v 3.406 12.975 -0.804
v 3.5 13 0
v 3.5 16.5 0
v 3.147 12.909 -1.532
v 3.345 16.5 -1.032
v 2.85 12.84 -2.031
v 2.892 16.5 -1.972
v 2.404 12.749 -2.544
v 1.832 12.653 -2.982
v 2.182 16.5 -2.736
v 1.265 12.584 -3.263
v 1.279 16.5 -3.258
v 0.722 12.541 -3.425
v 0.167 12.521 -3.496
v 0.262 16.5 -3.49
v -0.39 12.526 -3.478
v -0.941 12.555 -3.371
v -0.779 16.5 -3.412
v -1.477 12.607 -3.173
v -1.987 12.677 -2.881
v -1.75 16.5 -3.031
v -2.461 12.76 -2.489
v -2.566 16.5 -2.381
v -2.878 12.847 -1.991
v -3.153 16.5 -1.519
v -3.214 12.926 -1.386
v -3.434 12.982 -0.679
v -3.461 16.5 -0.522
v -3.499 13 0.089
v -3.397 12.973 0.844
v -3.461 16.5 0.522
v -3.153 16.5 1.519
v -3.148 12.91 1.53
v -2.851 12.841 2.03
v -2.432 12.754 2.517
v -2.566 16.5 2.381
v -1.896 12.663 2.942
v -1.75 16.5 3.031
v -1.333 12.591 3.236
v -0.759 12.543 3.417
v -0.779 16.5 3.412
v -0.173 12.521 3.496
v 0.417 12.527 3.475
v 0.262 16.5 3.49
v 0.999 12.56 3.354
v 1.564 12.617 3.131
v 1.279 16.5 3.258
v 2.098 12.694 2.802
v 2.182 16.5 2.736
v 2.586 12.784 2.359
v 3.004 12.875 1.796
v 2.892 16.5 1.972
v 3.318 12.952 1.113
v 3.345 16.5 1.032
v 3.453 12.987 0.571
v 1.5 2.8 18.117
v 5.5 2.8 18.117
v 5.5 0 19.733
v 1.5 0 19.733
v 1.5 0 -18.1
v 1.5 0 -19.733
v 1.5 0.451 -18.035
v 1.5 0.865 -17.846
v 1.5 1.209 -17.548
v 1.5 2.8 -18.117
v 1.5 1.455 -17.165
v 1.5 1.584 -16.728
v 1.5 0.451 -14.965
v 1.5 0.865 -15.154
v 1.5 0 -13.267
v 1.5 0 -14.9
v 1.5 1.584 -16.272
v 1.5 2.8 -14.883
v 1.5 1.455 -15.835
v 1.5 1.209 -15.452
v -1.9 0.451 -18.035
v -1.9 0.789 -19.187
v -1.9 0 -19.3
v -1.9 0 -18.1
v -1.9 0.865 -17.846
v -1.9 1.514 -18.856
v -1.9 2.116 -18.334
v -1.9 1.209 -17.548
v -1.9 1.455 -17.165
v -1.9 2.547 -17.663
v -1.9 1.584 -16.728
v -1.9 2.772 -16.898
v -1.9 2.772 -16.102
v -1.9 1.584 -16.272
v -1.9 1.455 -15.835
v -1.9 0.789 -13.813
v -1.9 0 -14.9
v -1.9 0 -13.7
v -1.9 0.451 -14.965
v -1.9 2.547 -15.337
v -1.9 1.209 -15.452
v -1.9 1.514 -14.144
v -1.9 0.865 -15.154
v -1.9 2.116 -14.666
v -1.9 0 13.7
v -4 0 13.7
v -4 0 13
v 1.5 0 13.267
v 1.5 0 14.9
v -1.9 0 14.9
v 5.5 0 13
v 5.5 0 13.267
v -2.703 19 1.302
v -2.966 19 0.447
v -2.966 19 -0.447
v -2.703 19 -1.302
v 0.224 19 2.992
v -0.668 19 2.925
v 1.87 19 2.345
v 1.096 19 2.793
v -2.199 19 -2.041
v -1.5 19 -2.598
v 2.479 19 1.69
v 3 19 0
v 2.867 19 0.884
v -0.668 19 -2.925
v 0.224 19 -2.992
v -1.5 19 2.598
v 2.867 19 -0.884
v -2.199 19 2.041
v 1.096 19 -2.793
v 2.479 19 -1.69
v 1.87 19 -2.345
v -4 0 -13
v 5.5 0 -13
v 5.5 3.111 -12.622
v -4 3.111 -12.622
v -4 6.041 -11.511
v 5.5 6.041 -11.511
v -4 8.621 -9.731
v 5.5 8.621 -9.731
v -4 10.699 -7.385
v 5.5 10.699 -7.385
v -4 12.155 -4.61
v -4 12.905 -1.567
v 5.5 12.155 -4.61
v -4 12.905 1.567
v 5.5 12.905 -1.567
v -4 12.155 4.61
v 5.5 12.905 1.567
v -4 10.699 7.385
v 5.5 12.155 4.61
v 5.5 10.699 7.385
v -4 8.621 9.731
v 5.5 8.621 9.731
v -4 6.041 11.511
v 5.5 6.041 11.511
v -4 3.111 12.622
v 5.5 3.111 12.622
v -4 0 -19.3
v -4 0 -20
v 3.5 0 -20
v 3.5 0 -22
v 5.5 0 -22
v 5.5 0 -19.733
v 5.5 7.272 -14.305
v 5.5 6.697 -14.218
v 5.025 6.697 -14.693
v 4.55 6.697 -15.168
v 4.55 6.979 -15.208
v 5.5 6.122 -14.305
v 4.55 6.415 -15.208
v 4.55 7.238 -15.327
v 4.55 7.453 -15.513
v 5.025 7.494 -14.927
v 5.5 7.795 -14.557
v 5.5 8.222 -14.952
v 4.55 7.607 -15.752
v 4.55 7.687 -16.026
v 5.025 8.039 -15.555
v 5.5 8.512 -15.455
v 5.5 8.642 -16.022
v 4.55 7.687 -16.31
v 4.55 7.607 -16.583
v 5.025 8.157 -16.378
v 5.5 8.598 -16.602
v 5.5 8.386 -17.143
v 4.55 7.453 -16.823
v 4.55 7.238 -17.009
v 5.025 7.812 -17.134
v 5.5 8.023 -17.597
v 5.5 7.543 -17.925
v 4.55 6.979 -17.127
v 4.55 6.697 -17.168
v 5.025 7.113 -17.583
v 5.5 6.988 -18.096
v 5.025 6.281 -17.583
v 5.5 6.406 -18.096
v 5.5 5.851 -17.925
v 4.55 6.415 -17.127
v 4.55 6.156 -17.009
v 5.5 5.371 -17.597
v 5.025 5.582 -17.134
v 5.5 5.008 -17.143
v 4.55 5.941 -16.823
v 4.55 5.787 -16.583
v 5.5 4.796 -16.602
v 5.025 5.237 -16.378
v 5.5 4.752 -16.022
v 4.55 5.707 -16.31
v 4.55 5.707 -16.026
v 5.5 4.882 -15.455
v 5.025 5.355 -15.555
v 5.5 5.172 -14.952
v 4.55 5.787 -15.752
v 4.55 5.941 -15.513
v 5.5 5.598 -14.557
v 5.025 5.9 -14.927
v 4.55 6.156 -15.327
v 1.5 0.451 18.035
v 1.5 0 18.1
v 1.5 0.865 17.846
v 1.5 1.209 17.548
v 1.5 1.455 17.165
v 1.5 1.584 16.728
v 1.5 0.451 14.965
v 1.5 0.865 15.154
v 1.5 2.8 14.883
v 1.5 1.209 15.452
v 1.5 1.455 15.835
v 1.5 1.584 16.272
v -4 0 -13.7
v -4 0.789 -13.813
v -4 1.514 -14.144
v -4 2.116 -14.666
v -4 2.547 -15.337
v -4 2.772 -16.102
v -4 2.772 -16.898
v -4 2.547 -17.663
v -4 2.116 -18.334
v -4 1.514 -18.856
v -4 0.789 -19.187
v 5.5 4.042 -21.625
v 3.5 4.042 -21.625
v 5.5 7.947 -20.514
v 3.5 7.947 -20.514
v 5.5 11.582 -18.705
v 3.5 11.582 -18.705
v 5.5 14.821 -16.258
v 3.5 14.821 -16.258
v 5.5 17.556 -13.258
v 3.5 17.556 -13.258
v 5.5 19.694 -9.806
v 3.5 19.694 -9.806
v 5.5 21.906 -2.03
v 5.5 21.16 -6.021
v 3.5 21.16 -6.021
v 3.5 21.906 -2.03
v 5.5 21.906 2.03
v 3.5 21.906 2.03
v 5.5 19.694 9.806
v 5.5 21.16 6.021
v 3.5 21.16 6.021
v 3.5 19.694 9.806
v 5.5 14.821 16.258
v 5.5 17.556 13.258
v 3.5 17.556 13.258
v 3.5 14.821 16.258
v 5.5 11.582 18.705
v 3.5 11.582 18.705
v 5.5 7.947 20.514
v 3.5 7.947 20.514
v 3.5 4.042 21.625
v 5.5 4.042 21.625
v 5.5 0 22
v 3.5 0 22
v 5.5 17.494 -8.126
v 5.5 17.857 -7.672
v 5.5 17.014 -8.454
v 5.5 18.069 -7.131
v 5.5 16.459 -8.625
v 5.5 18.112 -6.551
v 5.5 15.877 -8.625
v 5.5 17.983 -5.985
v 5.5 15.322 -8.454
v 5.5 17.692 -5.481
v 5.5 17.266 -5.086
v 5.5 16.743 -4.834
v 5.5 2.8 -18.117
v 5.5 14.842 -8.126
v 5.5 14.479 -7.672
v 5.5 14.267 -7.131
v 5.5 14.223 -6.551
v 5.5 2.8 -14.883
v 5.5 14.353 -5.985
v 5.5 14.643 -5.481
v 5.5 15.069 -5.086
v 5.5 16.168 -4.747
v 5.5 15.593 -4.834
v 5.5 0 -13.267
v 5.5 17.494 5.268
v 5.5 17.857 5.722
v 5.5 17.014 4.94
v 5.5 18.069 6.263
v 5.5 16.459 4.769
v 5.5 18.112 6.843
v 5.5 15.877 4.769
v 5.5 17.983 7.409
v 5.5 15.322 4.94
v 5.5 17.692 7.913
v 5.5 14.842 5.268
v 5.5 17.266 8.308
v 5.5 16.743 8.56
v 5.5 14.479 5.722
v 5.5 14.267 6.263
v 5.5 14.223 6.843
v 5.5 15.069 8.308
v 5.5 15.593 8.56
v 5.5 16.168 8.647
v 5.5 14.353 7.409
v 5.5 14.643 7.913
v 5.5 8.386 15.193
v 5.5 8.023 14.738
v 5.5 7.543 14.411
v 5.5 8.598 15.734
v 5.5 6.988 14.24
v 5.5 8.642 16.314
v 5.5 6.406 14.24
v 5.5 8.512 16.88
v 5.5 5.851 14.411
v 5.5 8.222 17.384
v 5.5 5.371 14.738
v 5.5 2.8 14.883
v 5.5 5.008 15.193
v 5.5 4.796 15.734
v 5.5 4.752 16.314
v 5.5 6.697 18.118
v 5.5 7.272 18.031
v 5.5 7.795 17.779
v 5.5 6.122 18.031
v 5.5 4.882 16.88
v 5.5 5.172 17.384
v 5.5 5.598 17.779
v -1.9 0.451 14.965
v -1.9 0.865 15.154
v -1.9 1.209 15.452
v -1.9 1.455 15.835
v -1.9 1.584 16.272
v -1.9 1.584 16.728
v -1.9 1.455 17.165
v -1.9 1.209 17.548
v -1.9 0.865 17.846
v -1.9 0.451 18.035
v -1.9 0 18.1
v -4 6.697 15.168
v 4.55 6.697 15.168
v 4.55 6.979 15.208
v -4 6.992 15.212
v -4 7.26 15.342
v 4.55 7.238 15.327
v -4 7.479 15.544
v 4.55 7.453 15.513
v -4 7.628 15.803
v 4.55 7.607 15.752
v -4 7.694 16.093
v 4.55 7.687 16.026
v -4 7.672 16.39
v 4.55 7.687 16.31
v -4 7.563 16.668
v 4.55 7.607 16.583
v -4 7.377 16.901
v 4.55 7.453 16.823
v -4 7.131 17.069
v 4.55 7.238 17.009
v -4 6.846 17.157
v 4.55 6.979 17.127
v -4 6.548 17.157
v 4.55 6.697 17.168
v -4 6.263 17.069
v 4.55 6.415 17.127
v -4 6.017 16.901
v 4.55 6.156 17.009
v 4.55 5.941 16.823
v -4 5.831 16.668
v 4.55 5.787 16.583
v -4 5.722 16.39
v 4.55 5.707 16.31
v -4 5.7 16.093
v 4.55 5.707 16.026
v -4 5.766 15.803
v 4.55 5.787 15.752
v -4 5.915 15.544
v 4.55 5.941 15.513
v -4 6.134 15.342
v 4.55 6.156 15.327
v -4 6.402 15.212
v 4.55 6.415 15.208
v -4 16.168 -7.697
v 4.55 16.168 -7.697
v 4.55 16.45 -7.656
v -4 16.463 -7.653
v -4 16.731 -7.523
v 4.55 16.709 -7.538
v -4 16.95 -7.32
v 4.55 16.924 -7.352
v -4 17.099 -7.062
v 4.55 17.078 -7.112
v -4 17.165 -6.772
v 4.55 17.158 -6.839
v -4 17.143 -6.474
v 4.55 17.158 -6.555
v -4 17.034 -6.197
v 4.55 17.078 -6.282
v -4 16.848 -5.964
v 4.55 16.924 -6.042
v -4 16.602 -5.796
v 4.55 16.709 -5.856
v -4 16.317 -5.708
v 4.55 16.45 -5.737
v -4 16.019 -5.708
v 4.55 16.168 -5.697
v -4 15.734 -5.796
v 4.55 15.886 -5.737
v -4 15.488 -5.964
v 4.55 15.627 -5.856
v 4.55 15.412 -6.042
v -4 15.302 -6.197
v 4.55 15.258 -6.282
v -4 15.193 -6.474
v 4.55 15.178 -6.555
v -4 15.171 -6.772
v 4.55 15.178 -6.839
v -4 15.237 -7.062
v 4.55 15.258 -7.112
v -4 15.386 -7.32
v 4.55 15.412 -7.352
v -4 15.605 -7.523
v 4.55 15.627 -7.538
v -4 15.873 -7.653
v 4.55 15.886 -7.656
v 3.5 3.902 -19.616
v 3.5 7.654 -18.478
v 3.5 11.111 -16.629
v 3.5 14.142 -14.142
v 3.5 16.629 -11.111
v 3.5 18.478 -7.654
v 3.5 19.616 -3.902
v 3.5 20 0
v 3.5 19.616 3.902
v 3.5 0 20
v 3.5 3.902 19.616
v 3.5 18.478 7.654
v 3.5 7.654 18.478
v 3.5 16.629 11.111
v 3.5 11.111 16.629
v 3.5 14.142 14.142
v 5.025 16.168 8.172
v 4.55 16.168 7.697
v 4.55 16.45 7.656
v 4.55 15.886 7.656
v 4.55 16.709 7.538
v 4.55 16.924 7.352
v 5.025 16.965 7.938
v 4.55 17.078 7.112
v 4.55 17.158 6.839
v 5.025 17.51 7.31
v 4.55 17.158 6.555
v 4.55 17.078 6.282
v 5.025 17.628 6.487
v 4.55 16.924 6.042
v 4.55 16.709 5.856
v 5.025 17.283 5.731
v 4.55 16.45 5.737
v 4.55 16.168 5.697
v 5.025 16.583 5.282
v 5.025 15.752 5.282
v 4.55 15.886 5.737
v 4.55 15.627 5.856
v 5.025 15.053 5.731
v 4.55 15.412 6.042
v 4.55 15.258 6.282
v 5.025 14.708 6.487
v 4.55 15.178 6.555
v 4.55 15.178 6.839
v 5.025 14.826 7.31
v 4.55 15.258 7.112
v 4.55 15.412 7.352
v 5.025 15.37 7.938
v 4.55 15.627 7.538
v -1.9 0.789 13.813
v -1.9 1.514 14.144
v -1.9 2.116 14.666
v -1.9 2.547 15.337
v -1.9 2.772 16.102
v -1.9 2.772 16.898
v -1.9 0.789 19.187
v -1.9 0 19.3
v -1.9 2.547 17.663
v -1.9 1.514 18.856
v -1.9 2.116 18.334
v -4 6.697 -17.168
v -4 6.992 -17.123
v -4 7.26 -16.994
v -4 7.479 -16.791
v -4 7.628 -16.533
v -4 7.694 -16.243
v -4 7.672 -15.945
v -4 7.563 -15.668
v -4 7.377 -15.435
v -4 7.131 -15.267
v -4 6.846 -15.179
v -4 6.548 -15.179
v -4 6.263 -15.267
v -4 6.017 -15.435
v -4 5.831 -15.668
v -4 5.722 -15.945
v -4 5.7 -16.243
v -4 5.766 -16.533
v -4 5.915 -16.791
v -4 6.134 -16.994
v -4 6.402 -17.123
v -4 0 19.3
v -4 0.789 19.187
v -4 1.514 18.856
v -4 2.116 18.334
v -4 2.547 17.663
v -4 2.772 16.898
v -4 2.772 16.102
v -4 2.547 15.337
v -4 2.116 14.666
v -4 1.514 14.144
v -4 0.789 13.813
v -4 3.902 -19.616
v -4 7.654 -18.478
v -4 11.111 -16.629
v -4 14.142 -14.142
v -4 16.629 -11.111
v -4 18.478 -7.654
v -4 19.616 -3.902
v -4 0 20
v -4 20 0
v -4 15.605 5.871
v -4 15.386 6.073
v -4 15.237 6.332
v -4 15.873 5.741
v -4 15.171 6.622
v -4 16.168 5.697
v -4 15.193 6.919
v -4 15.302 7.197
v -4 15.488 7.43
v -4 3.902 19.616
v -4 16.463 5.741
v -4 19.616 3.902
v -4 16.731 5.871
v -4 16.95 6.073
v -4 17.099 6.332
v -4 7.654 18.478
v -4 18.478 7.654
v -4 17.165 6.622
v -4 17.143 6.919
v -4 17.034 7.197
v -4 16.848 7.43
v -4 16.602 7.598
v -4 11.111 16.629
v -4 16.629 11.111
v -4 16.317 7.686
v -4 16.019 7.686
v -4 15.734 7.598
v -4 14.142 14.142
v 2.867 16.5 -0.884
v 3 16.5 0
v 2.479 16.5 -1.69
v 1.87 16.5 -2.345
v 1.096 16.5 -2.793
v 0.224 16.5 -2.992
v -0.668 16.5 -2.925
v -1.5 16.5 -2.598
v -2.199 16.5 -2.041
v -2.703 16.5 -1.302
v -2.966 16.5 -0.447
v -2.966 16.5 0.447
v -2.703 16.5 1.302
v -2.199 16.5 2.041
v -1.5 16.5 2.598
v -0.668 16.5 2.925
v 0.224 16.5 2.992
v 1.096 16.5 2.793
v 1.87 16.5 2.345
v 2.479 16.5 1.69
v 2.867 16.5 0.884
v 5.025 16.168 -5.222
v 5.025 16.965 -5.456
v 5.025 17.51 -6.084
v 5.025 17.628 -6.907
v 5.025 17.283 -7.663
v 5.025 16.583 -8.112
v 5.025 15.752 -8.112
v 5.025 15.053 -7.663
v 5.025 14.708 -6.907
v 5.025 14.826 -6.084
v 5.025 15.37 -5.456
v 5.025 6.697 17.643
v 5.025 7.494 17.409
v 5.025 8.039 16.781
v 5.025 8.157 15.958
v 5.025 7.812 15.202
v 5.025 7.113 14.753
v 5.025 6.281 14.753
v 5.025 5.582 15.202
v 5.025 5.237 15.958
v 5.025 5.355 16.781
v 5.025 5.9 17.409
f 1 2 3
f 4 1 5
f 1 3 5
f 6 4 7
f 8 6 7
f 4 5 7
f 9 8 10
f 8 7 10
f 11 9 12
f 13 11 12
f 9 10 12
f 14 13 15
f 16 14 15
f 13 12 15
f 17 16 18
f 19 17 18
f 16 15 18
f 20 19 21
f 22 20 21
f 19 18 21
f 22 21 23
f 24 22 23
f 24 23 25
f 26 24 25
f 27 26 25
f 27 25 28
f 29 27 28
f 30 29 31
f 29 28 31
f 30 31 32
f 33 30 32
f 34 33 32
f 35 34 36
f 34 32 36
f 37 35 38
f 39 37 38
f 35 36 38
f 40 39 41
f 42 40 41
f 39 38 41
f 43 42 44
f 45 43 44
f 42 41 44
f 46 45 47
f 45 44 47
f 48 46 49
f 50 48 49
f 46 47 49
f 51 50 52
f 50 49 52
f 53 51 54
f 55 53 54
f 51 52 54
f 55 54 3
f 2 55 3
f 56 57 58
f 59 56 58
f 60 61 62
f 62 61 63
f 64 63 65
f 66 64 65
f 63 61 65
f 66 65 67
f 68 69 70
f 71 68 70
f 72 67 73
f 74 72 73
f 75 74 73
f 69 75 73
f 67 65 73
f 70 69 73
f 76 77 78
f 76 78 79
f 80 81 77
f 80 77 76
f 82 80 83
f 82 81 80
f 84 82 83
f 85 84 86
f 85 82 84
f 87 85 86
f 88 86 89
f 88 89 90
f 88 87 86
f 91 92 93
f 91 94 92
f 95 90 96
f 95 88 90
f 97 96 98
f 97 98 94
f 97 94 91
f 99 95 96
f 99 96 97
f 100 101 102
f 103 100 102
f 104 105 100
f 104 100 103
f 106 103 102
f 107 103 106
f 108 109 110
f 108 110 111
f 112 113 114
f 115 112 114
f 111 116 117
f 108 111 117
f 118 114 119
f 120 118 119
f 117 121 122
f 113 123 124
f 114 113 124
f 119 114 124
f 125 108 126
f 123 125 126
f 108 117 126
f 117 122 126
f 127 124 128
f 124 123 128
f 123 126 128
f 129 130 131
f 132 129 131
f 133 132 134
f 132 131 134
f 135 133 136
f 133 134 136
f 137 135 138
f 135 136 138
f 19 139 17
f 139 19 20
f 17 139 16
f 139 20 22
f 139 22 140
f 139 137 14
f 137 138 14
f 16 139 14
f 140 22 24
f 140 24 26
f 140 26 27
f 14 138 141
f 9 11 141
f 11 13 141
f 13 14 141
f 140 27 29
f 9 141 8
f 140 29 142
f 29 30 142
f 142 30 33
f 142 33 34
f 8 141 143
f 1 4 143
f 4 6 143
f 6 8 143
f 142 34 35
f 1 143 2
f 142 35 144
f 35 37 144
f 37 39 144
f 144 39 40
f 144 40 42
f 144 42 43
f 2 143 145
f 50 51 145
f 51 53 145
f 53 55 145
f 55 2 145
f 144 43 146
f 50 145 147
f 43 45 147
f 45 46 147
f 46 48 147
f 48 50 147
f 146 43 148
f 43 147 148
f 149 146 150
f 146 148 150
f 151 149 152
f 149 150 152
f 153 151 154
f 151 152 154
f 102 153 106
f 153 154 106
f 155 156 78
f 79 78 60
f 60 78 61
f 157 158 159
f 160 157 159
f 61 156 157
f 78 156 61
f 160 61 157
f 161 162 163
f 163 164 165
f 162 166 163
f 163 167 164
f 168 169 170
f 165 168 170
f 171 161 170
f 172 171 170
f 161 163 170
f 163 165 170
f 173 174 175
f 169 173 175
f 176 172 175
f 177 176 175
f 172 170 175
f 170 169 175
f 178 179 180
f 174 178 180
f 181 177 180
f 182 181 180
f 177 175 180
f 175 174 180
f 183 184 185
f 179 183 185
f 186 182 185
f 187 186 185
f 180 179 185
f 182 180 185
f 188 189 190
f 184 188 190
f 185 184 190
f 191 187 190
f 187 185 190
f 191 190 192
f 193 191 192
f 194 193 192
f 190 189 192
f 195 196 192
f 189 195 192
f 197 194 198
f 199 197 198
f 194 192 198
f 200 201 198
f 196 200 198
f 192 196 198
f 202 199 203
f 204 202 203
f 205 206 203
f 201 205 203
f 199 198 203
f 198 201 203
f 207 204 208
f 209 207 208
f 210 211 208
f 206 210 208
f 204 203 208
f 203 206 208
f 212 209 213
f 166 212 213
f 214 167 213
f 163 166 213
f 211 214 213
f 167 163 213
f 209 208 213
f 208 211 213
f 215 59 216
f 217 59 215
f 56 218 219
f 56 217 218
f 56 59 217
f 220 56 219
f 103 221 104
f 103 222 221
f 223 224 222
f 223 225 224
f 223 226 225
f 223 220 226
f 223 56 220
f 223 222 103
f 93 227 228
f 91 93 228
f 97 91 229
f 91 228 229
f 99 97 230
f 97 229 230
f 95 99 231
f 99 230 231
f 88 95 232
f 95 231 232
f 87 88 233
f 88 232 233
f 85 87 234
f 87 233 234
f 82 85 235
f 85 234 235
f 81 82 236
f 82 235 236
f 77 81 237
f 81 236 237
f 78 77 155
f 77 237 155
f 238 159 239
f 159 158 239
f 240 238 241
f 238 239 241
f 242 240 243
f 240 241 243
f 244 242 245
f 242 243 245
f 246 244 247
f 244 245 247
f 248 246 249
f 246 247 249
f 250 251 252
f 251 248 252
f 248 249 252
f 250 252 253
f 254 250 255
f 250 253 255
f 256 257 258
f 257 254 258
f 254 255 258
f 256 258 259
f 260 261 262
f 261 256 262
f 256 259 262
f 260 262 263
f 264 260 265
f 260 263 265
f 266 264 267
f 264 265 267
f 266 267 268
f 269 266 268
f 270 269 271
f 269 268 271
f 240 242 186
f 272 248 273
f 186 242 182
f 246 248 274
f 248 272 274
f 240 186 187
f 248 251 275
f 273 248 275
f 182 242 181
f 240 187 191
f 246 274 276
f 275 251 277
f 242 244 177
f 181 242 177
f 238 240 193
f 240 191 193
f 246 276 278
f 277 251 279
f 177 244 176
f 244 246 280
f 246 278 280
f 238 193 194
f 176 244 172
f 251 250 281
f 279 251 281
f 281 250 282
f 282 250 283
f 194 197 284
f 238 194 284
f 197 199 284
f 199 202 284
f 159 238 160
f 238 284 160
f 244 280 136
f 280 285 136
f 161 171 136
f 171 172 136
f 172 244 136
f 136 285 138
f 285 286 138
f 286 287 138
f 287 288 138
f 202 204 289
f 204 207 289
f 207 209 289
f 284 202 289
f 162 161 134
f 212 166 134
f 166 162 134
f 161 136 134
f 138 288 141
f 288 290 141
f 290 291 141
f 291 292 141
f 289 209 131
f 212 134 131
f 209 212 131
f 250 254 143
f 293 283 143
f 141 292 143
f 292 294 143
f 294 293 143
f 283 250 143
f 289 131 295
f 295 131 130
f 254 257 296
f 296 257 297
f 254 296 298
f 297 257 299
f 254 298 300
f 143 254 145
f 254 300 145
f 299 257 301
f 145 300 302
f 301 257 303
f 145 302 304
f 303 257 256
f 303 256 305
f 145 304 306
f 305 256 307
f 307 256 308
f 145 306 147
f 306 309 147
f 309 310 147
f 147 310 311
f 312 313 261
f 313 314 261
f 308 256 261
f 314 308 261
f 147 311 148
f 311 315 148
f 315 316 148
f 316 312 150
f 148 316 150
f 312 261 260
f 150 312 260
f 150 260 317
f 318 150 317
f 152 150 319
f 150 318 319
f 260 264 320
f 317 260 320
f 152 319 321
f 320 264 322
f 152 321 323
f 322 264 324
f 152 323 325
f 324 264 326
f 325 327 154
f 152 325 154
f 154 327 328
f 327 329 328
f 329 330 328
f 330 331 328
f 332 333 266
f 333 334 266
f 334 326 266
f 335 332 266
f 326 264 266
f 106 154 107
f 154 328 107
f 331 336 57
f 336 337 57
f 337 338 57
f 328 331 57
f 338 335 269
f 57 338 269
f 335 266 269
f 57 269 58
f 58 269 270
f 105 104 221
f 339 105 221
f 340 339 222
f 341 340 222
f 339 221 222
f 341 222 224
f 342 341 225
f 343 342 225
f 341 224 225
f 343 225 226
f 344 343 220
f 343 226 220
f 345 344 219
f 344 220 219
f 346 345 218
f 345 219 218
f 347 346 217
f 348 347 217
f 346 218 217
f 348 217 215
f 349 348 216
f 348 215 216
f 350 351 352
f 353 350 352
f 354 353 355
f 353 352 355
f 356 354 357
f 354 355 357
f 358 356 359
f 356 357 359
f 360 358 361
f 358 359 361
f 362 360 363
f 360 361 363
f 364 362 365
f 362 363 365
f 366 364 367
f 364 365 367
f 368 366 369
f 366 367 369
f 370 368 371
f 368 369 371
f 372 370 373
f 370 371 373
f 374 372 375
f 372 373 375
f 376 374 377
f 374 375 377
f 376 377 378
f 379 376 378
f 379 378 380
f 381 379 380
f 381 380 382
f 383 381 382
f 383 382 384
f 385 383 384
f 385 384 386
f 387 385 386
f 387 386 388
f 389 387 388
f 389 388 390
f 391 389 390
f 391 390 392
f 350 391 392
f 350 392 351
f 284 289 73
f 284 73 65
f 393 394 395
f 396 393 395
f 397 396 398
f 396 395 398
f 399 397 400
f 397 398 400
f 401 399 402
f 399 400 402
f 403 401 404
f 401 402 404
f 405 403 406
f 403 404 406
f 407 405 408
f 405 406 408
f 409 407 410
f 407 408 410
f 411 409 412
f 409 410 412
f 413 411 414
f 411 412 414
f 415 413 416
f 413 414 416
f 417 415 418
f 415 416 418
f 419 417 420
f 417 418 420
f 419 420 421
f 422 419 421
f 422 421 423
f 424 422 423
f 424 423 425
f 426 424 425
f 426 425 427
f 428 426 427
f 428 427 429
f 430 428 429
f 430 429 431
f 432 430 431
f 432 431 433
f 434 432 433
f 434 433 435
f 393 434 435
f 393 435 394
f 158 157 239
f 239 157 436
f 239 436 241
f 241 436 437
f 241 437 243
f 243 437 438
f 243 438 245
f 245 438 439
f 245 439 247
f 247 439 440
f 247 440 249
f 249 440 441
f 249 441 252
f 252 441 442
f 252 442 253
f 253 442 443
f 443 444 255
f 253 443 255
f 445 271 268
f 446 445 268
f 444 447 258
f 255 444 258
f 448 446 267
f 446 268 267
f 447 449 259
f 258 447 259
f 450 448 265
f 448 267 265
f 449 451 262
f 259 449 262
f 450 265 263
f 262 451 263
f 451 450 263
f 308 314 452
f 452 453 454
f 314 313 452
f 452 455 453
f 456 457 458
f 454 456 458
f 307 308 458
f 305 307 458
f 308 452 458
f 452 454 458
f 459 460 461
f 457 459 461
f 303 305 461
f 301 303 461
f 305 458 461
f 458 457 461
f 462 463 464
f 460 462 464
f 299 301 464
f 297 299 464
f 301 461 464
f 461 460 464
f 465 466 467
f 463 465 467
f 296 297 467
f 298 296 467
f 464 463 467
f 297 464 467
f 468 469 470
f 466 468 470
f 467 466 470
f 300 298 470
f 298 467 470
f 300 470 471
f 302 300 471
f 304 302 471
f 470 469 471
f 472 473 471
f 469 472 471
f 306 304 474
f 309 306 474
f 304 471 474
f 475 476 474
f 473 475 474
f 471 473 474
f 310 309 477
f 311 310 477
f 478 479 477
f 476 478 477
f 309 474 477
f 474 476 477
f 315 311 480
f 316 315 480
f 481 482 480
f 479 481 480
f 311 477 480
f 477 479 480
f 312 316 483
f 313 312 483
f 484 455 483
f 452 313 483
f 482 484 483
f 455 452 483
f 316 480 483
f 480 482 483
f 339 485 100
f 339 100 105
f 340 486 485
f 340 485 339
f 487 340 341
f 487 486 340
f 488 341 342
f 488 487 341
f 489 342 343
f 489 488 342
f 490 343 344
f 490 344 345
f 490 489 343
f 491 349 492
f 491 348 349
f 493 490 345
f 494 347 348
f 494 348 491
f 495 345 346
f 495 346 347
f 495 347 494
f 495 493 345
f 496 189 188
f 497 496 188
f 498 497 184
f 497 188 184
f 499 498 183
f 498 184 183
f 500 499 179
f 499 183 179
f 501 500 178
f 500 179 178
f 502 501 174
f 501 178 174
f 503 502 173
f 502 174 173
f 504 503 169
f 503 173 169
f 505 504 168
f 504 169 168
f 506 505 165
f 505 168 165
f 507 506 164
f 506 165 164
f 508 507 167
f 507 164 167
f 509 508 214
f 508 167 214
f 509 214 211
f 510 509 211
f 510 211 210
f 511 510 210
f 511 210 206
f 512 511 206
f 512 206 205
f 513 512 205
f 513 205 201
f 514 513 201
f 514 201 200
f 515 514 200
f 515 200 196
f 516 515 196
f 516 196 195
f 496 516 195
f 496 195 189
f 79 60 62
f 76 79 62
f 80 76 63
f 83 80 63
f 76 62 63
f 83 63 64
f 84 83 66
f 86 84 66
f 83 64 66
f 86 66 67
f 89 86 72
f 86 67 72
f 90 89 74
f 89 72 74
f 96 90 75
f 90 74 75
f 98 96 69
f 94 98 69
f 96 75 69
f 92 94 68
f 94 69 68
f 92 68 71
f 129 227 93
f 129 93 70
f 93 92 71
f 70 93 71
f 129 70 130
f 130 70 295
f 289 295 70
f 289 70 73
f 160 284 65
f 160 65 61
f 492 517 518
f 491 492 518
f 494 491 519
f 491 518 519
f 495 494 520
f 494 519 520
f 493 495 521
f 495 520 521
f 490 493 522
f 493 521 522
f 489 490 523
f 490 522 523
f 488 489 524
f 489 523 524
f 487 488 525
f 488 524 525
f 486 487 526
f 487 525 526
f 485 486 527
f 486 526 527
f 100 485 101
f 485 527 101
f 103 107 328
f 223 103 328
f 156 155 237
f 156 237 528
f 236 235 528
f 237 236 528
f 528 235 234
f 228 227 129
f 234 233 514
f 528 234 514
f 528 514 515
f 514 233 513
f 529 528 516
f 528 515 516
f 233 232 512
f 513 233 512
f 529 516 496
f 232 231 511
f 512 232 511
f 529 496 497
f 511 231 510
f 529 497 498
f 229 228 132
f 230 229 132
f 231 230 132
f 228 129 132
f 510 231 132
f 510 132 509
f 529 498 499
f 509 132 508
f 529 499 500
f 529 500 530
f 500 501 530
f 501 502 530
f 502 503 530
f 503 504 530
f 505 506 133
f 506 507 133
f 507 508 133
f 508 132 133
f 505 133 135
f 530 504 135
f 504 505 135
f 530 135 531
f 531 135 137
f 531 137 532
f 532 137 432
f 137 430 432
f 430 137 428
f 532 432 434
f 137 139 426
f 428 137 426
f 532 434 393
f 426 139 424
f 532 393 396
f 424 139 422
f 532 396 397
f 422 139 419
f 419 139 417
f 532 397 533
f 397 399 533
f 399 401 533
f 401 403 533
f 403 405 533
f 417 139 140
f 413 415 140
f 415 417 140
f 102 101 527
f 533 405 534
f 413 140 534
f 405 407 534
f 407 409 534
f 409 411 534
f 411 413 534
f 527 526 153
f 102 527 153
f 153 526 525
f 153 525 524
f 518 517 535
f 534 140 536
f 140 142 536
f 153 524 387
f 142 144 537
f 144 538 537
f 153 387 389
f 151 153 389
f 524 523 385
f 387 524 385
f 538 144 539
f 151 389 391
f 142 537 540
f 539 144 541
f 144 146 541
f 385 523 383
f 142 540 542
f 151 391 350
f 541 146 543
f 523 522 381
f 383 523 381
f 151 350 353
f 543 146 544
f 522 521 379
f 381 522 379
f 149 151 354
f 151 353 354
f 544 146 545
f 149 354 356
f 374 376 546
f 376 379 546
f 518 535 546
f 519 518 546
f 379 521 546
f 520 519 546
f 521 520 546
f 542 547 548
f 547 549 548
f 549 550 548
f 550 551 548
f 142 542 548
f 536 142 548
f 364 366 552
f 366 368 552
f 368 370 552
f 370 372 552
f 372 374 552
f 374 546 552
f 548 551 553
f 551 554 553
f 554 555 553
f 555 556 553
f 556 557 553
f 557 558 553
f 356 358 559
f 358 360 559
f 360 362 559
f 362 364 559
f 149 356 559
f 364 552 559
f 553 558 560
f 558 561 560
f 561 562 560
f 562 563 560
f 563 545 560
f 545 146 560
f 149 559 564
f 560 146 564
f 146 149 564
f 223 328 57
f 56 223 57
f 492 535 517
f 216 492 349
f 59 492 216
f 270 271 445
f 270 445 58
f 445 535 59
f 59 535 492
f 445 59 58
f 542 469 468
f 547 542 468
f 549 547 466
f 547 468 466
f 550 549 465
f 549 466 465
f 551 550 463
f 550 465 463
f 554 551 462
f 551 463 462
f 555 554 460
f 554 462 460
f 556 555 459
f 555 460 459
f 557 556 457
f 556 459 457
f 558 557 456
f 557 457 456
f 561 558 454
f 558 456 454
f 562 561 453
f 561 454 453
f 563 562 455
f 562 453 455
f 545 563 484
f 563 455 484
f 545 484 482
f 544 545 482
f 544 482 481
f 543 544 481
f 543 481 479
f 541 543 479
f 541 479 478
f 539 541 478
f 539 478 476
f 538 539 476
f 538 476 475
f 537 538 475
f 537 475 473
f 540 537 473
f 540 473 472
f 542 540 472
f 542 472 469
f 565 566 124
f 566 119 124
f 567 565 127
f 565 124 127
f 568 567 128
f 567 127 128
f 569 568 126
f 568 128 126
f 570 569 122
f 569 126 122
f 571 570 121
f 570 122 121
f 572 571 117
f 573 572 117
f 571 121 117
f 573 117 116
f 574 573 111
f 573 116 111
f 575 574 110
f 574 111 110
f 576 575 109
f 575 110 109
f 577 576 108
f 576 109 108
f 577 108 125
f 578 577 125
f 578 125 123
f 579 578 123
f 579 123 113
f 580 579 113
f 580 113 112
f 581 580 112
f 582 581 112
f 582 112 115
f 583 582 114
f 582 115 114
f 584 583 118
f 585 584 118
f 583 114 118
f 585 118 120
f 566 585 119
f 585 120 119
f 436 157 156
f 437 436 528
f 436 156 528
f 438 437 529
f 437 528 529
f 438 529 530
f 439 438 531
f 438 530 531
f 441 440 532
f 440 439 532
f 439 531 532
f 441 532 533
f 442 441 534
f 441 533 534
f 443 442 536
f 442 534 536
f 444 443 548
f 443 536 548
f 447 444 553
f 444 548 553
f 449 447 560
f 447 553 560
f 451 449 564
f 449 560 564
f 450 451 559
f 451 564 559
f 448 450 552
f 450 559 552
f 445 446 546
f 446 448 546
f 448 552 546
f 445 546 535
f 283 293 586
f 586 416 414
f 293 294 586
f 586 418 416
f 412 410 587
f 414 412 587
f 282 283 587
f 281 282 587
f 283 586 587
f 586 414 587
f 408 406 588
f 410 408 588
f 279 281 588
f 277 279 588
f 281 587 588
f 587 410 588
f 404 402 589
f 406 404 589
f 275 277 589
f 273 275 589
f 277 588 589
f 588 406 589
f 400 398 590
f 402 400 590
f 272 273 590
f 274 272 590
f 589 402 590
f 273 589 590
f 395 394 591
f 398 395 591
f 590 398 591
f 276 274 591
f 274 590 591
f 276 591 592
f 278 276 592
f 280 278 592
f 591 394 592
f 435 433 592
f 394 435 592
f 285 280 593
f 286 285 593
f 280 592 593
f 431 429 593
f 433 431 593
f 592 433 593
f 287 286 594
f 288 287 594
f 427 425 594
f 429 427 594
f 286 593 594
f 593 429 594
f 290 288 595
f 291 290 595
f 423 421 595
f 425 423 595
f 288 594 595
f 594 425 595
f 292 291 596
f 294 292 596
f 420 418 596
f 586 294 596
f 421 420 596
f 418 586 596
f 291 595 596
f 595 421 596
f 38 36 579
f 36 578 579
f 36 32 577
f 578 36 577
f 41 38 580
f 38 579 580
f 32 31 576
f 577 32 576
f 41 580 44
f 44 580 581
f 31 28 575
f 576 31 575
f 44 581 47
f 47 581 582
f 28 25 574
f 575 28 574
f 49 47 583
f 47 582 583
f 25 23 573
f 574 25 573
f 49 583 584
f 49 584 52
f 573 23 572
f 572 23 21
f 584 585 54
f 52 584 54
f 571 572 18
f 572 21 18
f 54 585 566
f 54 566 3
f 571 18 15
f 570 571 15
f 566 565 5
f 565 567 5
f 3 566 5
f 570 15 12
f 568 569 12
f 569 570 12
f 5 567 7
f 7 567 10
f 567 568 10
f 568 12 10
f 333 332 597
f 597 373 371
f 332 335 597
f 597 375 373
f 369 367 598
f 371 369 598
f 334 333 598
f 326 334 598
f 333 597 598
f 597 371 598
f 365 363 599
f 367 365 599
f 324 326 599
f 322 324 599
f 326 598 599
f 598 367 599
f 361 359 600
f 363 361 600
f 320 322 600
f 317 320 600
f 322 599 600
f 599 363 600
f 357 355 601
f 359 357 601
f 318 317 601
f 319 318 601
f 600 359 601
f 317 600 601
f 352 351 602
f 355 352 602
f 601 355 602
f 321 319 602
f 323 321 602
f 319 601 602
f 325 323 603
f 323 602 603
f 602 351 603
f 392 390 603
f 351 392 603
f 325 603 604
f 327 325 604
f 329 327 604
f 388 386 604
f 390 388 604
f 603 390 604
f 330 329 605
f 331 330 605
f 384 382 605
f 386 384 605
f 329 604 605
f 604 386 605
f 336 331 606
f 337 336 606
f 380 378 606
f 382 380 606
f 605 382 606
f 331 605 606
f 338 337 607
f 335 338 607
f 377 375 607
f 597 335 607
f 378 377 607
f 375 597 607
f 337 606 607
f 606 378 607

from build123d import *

# Parameters (mm, degrees)
ROTATION1_ANGLE                                      = 180
FORMSENKUNG_F_R_M3_SENKSCHRAUBE_MIT_INNE_D           = 1.6
FORMSENKUNG_F_R_M3_SENKSCHRAUBE_MIT_INNE_DEPTH       = 12
FORMSENKUNG_F_R_M3_SENKSCHRAUBE_MIT_INNE_CSINK_D     = 3.9
FORMSENKUNG_F_R_M3_SENKSCHRAUBE_MIT_INNE_CSINK_ANGLE = 90
FORMSENKUNG_F_R_M3_SENKSCHRAUBE_MIT_INNE_TIP         = 0.480688495
SKIZZE12_R                                           = 1
SCHNITT_LINEAR_AUSTRAGEN1_DEPTH                      = 33.530754679
SKIZZE9_R                                            = 3
SCHNITT_LINEAR_AUSTRAGEN2_DEPTH                      = 19
SKIZZE9_5_R                                          = 3
SCHNITT_LINEAR_AUSTRAGEN3_DEPTH                      = 16.5
SCHNITT_LINEAR_AUSTRAGEN5_DEPTH                      = 4
STIRNSENKUNG_F_R_M3_D_NNKOPF_ZYLINDERSCH_D           = 3.2
STIRNSENKUNG_F_R_M3_D_NNKOPF_ZYLINDERSCH_CBORE_D     = 5.6
STIRNSENKUNG_F_R_M3_D_NNKOPF_ZYLINDERSCH_CBORE_DEPTH = 2.1


with BuildPart() as part:
    # Skizze4 → Rotation1 (revolve, symmetric)
    with BuildSketch(Plane.XY) as rotation1_sk:
        Polygon((3.5, 20), (-4, 20), (-4, 13), (5.5, 13), (5.5, 22), (3.5, 22), align=None)
    revolve(axis=Axis((0, 0, 0), (-1, 0, 0)), revolution_arc=ROTATION1_ANGLE / 2)
    revolve(rotation1_sk.sketch, axis=Axis((0, 0, 0), (1, 0, 0)), revolution_arc=ROTATION1_ANGLE / 2)

    # Formsenkung für M3 Senkschraube mit Innensechskant1
    with Locations(Plane(origin=(5.5, 0, 0), x_dir=(0, 0, -1), z_dir=(1, 0, 0))):
        with Locations((6.696960066, 16.167891819), (-16.167891819, 6.696960066), (-6.696960066, 16.167891819), (16.167891819, 6.696960066)):
            CounterSinkHole(FORMSENKUNG_F_R_M3_SENKSCHRAUBE_MIT_INNE_D / 2, FORMSENKUNG_F_R_M3_SENKSCHRAUBE_MIT_INNE_CSINK_D / 2, depth=FORMSENKUNG_F_R_M3_SENKSCHRAUBE_MIT_INNE_DEPTH, counter_sink_angle=FORMSENKUNG_F_R_M3_SENKSCHRAUBE_MIT_INNE_CSINK_ANGLE)
            with Locations((0, 0, -(FORMSENKUNG_F_R_M3_SENKSCHRAUBE_MIT_INNE_DEPTH + FORMSENKUNG_F_R_M3_SENKSCHRAUBE_MIT_INNE_TIP / 2))):  # 118° drill point
                Cone(0, FORMSENKUNG_F_R_M3_SENKSCHRAUBE_MIT_INNE_D / 2, FORMSENKUNG_F_R_M3_SENKSCHRAUBE_MIT_INNE_TIP, mode=Mode.SUBTRACT)

    # Skizze12 → Schnitt-Linear austragen1 (cut, through all)
    with BuildSketch(Plane(origin=(5.5, 0, 0), x_dir=(0, 0, -1), z_dir=(1, 0, 0))):
        with Locations((-6.696960066, 16.167891819)):
            Circle(SKIZZE12_R)
        with Locations((6.696960066, 16.167891819)):
            Circle(SKIZZE12_R)
        with Locations((16.167891819, 6.696960066)):
            Circle(SKIZZE12_R)
        with Locations((-16.167891819, 6.696960066)):
            Circle(SKIZZE12_R)
    extrude(amount=-SCHNITT_LINEAR_AUSTRAGEN1_DEPTH, mode=Mode.SUBTRACT)

    # Skizze9 → Schnitt-Linear austragen2 (cut, symmetric)
    with BuildSketch(Plane(origin=(0, 0, 0), x_dir=(1, 0, 0), z_dir=(0, 1, 0))):
        Circle(SKIZZE9_R)
    extrude(amount=SCHNITT_LINEAR_AUSTRAGEN2_DEPTH, both=True, mode=Mode.SUBTRACT)

    # Skizze9_5 → Schnitt-Linear austragen3 (cut, symmetric)
    with BuildSketch(Plane(origin=(0, 0, 0), x_dir=(1, 0, 0), z_dir=(0, 1, 0))):
        with BuildLine():
            ThreePointArc((3.5, 0), (1.616120146, 3.104537916), (-2.007517527, 2.867032155))
            ThreePointArc((-2.007517527, 2.867032155), (-3.5, 0), (-2.007517527, -2.867032155))
            ThreePointArc((-2.007517527, -2.867032155), (1.616120146, -3.104537916), (3.5, 0))
        make_face()
        Circle(SKIZZE9_5_R, mode=Mode.SUBTRACT)
    extrude(amount=SCHNITT_LINEAR_AUSTRAGEN3_DEPTH, both=True, mode=Mode.SUBTRACT)

    # Skizze15 → Schnitt-Linear austragen5 (cut)
    with BuildSketch(Plane(origin=(5.5, 0, 0), x_dir=(0, 0, -1), z_dir=(1, 0, 0))):
        Polygon((-14.883419246, 2.8), (-18.116580754, 2.8), (-19.733161507, 0), (-18.116580754, -2.8), (-14.883419246, -2.8), (-13.266838493, 0), align=None)
        Polygon((13.266838493, 0), (14.883419246, 2.8), (18.116580754, 2.8), (19.733161507, 0), (18.116580754, -2.8), (14.883419246, -2.8), align=None)
    extrude(amount=-SCHNITT_LINEAR_AUSTRAGEN5_DEPTH, mode=Mode.SUBTRACT)

    # Stirnsenkung für M3 Dünnkopf-Zylinderschraube mit Innensechskant1 (through all)
    with Locations(Plane.ZY.offset(4)):
        with Locations((16.5, 0), (-16.5, 0)):
            CounterBoreHole(STIRNSENKUNG_F_R_M3_D_NNKOPF_ZYLINDERSCH_D / 2, STIRNSENKUNG_F_R_M3_D_NNKOPF_ZYLINDERSCH_CBORE_D / 2, STIRNSENKUNG_F_R_M3_D_NNKOPF_ZYLINDERSCH_CBORE_DEPTH)


solid = part.part
